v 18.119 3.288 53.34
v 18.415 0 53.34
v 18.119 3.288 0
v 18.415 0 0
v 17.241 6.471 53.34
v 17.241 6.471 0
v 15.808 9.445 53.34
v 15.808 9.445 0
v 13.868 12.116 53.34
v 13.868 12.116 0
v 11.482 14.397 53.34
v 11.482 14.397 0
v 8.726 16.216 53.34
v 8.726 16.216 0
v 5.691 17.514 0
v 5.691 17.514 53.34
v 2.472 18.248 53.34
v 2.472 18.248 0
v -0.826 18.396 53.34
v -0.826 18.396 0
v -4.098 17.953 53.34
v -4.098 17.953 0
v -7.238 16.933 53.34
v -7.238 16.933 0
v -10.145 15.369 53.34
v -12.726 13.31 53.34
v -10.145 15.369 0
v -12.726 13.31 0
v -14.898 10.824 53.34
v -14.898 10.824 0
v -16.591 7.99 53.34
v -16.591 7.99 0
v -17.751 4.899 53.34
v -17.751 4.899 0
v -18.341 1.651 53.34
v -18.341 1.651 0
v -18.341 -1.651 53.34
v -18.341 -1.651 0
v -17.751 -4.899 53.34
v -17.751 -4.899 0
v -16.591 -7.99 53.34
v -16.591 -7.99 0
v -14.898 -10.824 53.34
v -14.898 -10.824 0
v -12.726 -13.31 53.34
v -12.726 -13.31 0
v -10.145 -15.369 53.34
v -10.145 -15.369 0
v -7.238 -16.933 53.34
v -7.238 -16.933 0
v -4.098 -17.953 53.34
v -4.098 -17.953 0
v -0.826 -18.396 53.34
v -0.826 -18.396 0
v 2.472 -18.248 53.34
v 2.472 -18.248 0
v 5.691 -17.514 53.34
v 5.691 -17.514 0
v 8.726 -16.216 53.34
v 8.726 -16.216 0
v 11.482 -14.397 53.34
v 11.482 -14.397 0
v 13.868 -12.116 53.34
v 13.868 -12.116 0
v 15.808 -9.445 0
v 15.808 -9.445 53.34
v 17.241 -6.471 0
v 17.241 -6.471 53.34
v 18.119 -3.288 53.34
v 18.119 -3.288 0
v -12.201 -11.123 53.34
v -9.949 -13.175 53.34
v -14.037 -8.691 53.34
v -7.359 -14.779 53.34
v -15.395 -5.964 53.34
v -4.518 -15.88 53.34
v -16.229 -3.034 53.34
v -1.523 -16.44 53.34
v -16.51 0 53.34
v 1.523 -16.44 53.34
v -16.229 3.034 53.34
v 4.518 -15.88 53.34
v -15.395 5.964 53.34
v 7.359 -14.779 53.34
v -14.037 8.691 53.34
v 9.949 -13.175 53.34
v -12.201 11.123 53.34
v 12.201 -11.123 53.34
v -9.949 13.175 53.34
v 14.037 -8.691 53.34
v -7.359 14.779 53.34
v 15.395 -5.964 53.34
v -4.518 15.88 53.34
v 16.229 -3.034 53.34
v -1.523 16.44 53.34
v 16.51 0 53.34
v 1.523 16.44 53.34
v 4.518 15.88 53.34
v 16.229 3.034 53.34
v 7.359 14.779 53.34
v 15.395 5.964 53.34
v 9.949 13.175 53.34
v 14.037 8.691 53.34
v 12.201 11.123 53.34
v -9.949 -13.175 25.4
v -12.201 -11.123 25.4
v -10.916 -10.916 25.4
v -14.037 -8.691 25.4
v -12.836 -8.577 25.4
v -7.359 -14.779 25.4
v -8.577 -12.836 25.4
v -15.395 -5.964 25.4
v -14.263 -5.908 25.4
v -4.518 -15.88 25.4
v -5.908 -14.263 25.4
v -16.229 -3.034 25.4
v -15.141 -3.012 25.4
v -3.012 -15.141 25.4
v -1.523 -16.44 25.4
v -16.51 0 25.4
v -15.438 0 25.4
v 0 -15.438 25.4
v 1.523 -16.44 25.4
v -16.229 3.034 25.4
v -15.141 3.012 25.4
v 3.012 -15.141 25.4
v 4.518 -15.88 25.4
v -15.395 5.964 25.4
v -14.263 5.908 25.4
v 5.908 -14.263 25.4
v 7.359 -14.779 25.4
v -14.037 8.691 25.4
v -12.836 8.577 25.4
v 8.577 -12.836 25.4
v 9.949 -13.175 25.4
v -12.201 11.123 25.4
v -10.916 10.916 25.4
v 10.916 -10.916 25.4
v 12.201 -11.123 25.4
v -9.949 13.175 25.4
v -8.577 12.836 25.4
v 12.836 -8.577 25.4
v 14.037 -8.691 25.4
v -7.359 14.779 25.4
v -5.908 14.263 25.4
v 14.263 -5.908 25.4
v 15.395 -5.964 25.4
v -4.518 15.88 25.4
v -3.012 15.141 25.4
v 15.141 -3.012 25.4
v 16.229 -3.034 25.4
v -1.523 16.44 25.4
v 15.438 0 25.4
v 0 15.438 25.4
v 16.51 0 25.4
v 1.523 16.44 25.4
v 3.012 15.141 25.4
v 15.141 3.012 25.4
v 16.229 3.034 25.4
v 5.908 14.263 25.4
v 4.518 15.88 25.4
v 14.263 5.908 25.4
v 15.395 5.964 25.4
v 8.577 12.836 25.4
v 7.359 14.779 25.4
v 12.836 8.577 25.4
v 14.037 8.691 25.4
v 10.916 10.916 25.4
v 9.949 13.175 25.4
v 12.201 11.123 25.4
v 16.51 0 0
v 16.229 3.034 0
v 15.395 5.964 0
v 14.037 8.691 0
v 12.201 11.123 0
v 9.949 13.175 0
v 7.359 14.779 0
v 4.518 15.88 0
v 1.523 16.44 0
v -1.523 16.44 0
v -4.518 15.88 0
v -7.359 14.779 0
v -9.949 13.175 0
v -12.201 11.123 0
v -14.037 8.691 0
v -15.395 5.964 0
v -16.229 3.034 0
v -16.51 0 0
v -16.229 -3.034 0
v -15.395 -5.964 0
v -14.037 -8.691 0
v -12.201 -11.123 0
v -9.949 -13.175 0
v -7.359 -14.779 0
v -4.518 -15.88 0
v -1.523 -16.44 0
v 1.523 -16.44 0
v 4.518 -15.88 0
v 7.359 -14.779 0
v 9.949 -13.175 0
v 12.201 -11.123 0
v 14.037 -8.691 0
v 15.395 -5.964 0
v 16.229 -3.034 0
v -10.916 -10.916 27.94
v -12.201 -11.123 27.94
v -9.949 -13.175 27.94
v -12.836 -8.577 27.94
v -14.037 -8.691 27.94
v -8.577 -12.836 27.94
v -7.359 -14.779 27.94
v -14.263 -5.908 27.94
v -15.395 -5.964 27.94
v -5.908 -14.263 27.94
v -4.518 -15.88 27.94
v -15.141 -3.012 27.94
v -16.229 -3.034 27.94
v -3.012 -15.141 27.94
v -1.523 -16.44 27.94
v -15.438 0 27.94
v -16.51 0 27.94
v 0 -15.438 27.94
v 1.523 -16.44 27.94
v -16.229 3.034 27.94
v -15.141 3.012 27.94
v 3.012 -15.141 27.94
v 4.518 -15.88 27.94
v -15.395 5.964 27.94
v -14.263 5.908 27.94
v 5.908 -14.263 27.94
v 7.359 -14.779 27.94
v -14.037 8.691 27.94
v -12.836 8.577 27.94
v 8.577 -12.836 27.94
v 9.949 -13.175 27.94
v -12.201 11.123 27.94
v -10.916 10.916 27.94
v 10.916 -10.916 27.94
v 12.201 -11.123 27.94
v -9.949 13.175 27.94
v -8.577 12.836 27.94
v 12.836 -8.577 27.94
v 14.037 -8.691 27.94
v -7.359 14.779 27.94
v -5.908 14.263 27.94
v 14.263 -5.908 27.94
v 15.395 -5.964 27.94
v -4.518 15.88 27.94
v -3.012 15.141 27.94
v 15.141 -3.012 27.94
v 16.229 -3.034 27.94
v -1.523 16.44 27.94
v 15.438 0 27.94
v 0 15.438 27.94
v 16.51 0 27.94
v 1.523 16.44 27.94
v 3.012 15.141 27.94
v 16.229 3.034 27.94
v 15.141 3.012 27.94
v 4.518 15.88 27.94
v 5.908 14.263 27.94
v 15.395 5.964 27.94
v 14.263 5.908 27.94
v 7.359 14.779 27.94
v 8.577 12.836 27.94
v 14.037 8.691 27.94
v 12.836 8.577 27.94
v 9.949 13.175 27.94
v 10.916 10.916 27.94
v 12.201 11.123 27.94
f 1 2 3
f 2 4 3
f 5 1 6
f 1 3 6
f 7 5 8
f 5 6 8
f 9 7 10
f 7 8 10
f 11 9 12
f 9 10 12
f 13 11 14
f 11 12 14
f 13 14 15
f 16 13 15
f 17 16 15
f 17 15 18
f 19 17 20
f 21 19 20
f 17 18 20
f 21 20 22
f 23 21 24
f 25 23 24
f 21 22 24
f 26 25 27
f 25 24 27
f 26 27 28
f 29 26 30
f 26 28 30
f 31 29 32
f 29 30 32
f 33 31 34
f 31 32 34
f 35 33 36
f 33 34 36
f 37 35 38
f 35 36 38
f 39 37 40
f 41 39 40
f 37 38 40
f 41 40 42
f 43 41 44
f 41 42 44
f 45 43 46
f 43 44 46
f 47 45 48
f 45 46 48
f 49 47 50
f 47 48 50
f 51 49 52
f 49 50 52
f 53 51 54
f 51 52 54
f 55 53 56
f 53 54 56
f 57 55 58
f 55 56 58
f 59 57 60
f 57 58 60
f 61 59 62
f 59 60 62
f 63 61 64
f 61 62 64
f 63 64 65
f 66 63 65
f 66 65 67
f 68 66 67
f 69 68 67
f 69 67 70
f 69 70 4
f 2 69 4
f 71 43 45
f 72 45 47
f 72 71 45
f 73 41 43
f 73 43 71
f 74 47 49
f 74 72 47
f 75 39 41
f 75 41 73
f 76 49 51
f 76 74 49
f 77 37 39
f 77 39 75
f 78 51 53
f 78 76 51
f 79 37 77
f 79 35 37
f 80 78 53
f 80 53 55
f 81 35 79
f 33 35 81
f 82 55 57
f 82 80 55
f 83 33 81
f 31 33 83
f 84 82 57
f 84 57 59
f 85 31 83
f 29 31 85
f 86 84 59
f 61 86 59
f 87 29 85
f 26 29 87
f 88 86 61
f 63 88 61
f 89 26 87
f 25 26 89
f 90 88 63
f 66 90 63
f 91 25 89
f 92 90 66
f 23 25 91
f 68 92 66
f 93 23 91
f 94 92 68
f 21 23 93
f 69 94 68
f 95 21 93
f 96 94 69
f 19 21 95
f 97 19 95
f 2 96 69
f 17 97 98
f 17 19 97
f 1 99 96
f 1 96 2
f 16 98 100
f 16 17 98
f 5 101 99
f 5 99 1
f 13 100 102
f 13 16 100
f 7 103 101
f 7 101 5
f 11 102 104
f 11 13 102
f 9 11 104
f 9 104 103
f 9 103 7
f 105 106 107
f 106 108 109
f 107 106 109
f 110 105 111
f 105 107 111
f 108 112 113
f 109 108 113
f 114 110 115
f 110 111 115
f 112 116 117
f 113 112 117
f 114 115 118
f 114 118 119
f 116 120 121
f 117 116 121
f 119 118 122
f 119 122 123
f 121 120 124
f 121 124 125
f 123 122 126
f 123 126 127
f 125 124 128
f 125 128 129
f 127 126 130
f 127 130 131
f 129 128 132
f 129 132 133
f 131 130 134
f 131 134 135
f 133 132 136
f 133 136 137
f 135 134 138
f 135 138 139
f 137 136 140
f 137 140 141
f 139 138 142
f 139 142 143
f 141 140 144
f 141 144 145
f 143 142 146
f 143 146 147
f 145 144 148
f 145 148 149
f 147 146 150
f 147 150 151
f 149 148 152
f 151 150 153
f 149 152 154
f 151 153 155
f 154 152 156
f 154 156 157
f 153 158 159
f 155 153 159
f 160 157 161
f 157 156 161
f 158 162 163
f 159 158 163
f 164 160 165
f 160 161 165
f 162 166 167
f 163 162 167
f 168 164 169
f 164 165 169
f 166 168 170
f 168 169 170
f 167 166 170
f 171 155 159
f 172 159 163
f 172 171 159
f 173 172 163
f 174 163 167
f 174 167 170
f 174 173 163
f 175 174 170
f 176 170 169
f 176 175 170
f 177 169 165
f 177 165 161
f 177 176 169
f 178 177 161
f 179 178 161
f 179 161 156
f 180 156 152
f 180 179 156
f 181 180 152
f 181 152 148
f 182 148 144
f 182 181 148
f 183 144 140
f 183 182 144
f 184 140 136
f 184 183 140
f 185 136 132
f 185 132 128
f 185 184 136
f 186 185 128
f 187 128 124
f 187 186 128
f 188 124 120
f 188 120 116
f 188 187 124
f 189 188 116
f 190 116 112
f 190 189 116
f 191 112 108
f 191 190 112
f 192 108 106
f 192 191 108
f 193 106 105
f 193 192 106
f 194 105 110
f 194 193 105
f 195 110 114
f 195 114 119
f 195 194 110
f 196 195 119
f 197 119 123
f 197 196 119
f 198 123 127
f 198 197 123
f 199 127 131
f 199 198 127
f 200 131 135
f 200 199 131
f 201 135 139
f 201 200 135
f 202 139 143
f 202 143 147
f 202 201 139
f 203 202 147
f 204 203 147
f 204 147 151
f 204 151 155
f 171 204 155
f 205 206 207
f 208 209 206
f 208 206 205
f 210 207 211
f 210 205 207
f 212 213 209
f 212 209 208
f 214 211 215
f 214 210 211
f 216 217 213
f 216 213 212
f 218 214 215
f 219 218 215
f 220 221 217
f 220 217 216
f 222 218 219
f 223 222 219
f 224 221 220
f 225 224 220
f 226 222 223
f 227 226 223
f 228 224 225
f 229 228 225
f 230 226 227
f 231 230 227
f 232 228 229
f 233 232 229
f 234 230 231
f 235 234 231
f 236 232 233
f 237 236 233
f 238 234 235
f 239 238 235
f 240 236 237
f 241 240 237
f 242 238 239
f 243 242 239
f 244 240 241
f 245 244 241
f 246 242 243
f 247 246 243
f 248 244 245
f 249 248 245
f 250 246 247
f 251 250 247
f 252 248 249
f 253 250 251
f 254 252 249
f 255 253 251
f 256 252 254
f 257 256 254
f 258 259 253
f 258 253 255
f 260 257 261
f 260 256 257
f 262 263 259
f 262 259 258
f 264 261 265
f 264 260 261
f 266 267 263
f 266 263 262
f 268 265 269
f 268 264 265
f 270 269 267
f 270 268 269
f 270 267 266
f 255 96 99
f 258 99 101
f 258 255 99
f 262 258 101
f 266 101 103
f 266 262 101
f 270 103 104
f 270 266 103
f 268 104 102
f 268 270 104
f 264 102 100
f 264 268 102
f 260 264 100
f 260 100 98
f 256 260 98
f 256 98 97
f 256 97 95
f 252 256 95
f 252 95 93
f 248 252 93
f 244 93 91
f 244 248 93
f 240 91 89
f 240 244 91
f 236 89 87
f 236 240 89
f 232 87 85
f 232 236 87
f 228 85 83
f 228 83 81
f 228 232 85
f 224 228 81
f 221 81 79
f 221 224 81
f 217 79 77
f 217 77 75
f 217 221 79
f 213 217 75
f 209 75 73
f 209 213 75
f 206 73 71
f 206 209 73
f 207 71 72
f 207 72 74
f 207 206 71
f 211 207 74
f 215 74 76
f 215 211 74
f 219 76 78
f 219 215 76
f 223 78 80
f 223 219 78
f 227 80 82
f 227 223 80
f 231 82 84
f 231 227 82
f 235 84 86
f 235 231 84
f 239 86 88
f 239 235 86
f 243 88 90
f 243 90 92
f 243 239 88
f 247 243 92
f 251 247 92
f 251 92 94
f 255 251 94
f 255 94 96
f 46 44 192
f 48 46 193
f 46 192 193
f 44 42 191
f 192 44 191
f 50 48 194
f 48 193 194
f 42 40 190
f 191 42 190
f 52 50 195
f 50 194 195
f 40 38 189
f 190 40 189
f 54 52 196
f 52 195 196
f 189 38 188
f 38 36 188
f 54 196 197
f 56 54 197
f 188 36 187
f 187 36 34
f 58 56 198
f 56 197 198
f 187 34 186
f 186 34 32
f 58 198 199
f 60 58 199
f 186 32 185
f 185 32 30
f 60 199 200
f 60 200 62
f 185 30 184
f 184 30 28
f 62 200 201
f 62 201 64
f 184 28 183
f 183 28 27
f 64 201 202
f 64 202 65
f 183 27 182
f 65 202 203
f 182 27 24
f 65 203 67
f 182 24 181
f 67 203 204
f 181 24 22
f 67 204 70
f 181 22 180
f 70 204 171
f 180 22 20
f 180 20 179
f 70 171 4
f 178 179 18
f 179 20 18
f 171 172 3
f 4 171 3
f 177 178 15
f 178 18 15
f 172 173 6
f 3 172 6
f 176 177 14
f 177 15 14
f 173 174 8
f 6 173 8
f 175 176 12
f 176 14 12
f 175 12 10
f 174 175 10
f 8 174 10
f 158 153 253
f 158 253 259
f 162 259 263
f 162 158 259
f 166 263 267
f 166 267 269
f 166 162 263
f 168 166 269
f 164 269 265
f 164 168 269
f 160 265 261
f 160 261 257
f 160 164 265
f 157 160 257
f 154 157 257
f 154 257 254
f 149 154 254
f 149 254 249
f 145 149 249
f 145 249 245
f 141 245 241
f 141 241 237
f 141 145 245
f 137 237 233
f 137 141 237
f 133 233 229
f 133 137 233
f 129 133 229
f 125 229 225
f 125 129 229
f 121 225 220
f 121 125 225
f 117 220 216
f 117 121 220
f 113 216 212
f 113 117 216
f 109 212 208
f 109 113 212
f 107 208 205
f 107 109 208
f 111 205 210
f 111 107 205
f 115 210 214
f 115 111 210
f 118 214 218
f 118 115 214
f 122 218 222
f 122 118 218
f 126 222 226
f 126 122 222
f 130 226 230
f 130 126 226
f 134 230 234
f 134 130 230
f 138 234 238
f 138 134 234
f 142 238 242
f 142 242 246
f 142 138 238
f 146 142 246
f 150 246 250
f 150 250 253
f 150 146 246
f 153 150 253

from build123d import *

# Parameters (mm, degrees)
F0_R     = 18.415
F0_R_2   = 16.51
F1_DEPTH = 25.4
F3_R     = 18.415
F3_R_2   = 16.51
F3_R_3   = 15.4378836309
F4_DEPTH = 2.54
F5_R     = 18.415
F5_R_2   = 16.51
F6_DEPTH = 25.4


with BuildPart() as f1:
    # F0 (on Top) → F1 (new body)
    with BuildSketch(Plane.XY):
        Circle(F0_R)
        Circle(F0_R_2, mode=Mode.SUBTRACT)
    extrude(amount=F1_DEPTH)

    # F3 (on offset) → F4 (join)
    with BuildSketch(Plane.XY.offset(25.4)):
        Circle(F3_R)
        Circle(F3_R_2, mode=Mode.SUBTRACT)
        Circle(F3_R_2)
        Circle(F3_R_3, mode=Mode.SUBTRACT)
    extrude(amount=F4_DEPTH)

    # F5 (on face) → F6 (join)
    with BuildSketch(Plane.XY.offset(27.94)):
        Circle(F5_R)
        Circle(F5_R_2, mode=Mode.SUBTRACT)
    extrude(amount=F6_DEPTH)


solid = f1.part
